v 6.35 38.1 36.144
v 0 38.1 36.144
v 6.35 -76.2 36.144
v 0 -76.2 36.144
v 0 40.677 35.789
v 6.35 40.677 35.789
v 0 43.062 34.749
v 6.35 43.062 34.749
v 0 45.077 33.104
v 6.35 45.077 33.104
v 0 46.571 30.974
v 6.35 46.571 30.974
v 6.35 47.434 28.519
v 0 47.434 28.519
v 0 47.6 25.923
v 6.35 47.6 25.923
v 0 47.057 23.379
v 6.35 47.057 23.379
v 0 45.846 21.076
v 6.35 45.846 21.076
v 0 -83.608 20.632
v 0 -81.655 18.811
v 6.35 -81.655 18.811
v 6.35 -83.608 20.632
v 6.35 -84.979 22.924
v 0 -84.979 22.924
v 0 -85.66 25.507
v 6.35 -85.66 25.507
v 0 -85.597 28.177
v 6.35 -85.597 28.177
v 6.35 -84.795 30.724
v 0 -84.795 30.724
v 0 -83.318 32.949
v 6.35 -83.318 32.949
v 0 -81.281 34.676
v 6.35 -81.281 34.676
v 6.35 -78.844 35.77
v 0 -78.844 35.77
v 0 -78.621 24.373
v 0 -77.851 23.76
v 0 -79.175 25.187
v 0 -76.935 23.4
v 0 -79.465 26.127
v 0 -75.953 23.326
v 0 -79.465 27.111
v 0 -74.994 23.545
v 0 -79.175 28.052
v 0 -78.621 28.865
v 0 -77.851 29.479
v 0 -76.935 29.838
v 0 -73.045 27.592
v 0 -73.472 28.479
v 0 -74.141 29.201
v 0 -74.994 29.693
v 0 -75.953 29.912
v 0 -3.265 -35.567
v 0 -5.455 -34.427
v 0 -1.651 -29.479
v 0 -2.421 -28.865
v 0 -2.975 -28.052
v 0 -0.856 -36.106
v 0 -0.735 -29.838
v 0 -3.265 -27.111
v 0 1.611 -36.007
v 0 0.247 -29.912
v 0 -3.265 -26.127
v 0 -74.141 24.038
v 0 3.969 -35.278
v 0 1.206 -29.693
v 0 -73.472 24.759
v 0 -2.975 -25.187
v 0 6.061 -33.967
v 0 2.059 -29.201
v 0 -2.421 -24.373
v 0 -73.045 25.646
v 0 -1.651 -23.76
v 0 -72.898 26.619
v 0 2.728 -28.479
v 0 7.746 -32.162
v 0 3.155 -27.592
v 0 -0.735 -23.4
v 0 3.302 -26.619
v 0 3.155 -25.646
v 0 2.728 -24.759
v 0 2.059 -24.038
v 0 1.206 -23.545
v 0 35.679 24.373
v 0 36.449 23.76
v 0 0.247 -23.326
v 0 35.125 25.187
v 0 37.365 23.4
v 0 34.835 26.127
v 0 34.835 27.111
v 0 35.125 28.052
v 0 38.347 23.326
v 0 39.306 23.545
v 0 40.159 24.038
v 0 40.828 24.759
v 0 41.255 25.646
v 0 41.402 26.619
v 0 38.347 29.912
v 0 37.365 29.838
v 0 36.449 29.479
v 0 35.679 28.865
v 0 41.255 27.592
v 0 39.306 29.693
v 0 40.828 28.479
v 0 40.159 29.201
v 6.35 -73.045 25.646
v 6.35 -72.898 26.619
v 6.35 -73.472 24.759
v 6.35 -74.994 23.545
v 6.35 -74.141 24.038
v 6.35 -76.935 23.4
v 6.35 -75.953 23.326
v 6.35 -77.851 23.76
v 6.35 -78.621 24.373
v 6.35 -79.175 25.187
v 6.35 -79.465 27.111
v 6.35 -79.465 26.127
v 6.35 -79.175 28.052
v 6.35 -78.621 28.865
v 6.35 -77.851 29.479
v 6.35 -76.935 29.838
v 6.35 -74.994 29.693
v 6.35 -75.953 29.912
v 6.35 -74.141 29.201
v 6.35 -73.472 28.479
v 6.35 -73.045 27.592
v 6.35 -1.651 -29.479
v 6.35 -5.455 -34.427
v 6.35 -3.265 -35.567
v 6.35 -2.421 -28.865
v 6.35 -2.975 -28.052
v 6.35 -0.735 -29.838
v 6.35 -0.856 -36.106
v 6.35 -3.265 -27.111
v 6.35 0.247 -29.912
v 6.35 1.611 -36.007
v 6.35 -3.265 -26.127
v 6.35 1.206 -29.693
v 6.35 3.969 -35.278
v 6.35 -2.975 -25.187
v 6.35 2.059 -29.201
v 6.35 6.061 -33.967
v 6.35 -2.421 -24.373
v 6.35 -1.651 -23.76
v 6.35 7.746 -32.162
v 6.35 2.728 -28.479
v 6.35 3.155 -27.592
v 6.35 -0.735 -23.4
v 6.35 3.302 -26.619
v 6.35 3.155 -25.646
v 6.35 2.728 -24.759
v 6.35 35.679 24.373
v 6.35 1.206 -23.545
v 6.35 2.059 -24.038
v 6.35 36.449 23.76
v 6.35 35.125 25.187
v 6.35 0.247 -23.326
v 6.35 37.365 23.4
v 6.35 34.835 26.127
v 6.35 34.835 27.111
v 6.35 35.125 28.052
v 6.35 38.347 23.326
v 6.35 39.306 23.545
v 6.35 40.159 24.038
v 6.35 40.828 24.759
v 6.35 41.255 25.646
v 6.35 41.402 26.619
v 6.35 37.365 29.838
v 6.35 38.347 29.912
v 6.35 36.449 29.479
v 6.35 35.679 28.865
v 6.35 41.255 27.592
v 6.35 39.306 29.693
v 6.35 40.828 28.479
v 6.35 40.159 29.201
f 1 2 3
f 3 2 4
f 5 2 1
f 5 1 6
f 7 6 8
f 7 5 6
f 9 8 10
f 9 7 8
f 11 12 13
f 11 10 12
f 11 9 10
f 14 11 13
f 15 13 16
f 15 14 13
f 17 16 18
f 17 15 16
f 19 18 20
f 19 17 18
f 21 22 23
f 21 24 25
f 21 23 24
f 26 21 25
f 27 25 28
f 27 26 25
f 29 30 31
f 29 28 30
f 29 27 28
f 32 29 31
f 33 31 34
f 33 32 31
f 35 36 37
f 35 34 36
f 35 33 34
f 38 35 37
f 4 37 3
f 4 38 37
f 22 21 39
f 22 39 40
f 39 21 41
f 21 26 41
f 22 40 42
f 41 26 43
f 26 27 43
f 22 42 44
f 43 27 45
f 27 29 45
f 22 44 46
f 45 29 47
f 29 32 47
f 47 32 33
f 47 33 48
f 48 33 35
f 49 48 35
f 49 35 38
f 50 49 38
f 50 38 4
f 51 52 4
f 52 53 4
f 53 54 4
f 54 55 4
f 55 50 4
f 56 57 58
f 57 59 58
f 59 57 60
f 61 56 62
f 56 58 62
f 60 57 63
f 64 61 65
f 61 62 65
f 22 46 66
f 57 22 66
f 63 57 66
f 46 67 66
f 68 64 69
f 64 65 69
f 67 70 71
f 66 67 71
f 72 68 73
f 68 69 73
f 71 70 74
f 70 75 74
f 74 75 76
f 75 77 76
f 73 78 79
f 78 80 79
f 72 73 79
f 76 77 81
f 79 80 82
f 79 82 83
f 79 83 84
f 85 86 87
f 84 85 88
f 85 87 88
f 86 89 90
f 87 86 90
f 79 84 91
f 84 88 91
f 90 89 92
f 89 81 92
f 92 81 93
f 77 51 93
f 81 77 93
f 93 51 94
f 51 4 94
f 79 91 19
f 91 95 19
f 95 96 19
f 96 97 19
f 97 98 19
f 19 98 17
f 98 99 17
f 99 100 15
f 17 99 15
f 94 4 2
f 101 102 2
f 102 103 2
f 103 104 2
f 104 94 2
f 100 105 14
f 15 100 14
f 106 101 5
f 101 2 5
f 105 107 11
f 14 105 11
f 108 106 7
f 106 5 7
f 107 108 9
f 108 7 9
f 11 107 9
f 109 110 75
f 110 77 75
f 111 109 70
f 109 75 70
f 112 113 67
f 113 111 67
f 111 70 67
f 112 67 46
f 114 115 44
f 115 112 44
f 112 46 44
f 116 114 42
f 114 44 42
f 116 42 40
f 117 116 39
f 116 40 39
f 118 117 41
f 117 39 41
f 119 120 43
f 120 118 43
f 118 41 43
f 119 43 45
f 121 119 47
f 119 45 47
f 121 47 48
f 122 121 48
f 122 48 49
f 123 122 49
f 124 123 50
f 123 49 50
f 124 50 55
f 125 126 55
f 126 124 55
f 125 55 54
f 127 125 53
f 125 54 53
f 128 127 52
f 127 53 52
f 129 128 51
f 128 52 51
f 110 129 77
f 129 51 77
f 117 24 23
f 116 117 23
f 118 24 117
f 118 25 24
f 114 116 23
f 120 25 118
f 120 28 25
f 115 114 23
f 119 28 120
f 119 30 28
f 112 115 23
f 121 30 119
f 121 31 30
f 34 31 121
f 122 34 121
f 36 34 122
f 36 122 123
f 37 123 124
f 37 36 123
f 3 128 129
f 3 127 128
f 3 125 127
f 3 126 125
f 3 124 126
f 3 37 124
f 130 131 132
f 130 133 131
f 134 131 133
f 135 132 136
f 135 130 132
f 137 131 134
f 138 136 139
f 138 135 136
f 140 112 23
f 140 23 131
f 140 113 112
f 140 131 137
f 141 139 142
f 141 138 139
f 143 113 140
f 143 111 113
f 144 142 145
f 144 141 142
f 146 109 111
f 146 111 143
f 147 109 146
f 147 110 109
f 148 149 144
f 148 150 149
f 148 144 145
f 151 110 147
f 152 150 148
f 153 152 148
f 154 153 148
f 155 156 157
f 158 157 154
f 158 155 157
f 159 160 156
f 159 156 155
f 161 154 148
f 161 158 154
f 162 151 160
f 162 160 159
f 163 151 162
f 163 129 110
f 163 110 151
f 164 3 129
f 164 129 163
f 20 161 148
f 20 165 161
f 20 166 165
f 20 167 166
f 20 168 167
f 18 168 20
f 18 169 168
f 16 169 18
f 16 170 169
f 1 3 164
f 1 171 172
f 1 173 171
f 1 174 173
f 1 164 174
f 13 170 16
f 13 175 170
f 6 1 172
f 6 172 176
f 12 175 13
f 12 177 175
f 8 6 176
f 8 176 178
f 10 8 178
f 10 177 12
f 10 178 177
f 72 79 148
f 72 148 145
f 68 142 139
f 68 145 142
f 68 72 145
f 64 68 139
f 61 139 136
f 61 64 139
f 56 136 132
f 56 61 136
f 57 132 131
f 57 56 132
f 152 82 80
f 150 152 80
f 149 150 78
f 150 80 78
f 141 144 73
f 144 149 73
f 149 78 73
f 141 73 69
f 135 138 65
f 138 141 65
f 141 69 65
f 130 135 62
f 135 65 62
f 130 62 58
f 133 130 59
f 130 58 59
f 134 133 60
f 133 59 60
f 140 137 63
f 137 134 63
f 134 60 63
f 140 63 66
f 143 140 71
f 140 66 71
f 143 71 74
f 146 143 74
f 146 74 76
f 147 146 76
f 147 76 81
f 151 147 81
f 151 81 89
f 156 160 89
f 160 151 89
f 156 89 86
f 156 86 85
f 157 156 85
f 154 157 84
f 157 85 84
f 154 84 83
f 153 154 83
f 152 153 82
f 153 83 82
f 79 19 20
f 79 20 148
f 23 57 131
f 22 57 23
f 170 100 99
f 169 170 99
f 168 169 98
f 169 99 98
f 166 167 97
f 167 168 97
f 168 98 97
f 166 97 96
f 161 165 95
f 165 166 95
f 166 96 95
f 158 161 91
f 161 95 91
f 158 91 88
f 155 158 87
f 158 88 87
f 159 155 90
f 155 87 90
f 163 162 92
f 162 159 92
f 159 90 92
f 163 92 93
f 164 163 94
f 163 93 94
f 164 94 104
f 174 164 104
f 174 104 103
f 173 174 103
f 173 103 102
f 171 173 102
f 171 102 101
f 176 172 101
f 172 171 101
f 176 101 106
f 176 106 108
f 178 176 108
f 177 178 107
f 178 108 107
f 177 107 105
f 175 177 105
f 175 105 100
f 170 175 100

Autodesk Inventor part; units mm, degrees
ref_plane "YZ Plane" through (0, 0, 0) normal (1, 0, 0) x (0, 1, 0)
ref_plane "XZ Plane" through (0, 0, 0) normal (0, 1, 0) x (-1, 0, 0)
ref_plane "XY Plane" through (0, 0, 0) normal (0, 0, 1) x (1, 0, 0)
sketch "Sketch1" plane through (0, 0, 0) normal (1, 0, 0) x (0, 1, 0)
  line L0 (-420.7488, 12.7) -> (420.7488, 12.7) construction
  line L1 (420.7488, 12.7) -> (420.7488, -12.7)
  line L2 (420.7488, -12.7) -> (-420.7488, -12.7) construction
  line L3 (-420.7488, -12.7) -> (-420.7488, 12.7)
  line L4 (0, 0) -> (0, -26.6192) construction
  circle A0 centre (0, -26.6192) radius 3.302
  line L5 (420.7488, 0) -> (-420.7488, 0) construction
  circle A1 centre (38.1, 26.6192) radius 3.302
  circle A2 centre (-76.2, 26.6192) radius 3.302
  line L6 (38.1, 26.6192) -> (-76.2, 26.6192) construction
  line L7 (0, 0) -> (0, 26.6192) construction
  circle A3 centre (0, -26.6192) radius 15.875 construction
  circle A4 centre (38.1, 26.6192) radius 15.875 construction
  circle A5 centre (-76.2, 26.6192) radius 15.875 construction
  line L8 (0, -26.6192) -> (-76.2, 26.6192) construction
  arc A6 (45.8458, 21.0759) -> (38.1, 36.1442) centre (38.1, 26.6192) ccw
  arc A7 (-76.2, 36.1442) -> (-81.6552, 18.8111) centre (-76.2, 26.6192) ccw
  line L9 (38.1, 36.1442) -> (-76.2, 36.1442)
  line L10 (45.8458, 21.0759) -> (7.7458, -32.1625)
  line L11 (-5.4552, -34.4273) -> (-81.6552, 18.8111)
  arc A8 (-5.4552, -34.4273) -> (7.7458, -32.1625) centre (0, -26.6192) ccw
  dimension "d0" = 25.4
  dimension "d1" = 6.604
  dimension "d2" = 13.9192
  dimension "d3" = 31.75
  dimension "d4" = 38.1
  dimension "d5" = 76.2
  dimension "d6" = 9.525
extrude "Extrusion1" add sketch "Sketch1" along normal blind 6.35
properties part number "carriage plate" material "Aluminum 6061"
